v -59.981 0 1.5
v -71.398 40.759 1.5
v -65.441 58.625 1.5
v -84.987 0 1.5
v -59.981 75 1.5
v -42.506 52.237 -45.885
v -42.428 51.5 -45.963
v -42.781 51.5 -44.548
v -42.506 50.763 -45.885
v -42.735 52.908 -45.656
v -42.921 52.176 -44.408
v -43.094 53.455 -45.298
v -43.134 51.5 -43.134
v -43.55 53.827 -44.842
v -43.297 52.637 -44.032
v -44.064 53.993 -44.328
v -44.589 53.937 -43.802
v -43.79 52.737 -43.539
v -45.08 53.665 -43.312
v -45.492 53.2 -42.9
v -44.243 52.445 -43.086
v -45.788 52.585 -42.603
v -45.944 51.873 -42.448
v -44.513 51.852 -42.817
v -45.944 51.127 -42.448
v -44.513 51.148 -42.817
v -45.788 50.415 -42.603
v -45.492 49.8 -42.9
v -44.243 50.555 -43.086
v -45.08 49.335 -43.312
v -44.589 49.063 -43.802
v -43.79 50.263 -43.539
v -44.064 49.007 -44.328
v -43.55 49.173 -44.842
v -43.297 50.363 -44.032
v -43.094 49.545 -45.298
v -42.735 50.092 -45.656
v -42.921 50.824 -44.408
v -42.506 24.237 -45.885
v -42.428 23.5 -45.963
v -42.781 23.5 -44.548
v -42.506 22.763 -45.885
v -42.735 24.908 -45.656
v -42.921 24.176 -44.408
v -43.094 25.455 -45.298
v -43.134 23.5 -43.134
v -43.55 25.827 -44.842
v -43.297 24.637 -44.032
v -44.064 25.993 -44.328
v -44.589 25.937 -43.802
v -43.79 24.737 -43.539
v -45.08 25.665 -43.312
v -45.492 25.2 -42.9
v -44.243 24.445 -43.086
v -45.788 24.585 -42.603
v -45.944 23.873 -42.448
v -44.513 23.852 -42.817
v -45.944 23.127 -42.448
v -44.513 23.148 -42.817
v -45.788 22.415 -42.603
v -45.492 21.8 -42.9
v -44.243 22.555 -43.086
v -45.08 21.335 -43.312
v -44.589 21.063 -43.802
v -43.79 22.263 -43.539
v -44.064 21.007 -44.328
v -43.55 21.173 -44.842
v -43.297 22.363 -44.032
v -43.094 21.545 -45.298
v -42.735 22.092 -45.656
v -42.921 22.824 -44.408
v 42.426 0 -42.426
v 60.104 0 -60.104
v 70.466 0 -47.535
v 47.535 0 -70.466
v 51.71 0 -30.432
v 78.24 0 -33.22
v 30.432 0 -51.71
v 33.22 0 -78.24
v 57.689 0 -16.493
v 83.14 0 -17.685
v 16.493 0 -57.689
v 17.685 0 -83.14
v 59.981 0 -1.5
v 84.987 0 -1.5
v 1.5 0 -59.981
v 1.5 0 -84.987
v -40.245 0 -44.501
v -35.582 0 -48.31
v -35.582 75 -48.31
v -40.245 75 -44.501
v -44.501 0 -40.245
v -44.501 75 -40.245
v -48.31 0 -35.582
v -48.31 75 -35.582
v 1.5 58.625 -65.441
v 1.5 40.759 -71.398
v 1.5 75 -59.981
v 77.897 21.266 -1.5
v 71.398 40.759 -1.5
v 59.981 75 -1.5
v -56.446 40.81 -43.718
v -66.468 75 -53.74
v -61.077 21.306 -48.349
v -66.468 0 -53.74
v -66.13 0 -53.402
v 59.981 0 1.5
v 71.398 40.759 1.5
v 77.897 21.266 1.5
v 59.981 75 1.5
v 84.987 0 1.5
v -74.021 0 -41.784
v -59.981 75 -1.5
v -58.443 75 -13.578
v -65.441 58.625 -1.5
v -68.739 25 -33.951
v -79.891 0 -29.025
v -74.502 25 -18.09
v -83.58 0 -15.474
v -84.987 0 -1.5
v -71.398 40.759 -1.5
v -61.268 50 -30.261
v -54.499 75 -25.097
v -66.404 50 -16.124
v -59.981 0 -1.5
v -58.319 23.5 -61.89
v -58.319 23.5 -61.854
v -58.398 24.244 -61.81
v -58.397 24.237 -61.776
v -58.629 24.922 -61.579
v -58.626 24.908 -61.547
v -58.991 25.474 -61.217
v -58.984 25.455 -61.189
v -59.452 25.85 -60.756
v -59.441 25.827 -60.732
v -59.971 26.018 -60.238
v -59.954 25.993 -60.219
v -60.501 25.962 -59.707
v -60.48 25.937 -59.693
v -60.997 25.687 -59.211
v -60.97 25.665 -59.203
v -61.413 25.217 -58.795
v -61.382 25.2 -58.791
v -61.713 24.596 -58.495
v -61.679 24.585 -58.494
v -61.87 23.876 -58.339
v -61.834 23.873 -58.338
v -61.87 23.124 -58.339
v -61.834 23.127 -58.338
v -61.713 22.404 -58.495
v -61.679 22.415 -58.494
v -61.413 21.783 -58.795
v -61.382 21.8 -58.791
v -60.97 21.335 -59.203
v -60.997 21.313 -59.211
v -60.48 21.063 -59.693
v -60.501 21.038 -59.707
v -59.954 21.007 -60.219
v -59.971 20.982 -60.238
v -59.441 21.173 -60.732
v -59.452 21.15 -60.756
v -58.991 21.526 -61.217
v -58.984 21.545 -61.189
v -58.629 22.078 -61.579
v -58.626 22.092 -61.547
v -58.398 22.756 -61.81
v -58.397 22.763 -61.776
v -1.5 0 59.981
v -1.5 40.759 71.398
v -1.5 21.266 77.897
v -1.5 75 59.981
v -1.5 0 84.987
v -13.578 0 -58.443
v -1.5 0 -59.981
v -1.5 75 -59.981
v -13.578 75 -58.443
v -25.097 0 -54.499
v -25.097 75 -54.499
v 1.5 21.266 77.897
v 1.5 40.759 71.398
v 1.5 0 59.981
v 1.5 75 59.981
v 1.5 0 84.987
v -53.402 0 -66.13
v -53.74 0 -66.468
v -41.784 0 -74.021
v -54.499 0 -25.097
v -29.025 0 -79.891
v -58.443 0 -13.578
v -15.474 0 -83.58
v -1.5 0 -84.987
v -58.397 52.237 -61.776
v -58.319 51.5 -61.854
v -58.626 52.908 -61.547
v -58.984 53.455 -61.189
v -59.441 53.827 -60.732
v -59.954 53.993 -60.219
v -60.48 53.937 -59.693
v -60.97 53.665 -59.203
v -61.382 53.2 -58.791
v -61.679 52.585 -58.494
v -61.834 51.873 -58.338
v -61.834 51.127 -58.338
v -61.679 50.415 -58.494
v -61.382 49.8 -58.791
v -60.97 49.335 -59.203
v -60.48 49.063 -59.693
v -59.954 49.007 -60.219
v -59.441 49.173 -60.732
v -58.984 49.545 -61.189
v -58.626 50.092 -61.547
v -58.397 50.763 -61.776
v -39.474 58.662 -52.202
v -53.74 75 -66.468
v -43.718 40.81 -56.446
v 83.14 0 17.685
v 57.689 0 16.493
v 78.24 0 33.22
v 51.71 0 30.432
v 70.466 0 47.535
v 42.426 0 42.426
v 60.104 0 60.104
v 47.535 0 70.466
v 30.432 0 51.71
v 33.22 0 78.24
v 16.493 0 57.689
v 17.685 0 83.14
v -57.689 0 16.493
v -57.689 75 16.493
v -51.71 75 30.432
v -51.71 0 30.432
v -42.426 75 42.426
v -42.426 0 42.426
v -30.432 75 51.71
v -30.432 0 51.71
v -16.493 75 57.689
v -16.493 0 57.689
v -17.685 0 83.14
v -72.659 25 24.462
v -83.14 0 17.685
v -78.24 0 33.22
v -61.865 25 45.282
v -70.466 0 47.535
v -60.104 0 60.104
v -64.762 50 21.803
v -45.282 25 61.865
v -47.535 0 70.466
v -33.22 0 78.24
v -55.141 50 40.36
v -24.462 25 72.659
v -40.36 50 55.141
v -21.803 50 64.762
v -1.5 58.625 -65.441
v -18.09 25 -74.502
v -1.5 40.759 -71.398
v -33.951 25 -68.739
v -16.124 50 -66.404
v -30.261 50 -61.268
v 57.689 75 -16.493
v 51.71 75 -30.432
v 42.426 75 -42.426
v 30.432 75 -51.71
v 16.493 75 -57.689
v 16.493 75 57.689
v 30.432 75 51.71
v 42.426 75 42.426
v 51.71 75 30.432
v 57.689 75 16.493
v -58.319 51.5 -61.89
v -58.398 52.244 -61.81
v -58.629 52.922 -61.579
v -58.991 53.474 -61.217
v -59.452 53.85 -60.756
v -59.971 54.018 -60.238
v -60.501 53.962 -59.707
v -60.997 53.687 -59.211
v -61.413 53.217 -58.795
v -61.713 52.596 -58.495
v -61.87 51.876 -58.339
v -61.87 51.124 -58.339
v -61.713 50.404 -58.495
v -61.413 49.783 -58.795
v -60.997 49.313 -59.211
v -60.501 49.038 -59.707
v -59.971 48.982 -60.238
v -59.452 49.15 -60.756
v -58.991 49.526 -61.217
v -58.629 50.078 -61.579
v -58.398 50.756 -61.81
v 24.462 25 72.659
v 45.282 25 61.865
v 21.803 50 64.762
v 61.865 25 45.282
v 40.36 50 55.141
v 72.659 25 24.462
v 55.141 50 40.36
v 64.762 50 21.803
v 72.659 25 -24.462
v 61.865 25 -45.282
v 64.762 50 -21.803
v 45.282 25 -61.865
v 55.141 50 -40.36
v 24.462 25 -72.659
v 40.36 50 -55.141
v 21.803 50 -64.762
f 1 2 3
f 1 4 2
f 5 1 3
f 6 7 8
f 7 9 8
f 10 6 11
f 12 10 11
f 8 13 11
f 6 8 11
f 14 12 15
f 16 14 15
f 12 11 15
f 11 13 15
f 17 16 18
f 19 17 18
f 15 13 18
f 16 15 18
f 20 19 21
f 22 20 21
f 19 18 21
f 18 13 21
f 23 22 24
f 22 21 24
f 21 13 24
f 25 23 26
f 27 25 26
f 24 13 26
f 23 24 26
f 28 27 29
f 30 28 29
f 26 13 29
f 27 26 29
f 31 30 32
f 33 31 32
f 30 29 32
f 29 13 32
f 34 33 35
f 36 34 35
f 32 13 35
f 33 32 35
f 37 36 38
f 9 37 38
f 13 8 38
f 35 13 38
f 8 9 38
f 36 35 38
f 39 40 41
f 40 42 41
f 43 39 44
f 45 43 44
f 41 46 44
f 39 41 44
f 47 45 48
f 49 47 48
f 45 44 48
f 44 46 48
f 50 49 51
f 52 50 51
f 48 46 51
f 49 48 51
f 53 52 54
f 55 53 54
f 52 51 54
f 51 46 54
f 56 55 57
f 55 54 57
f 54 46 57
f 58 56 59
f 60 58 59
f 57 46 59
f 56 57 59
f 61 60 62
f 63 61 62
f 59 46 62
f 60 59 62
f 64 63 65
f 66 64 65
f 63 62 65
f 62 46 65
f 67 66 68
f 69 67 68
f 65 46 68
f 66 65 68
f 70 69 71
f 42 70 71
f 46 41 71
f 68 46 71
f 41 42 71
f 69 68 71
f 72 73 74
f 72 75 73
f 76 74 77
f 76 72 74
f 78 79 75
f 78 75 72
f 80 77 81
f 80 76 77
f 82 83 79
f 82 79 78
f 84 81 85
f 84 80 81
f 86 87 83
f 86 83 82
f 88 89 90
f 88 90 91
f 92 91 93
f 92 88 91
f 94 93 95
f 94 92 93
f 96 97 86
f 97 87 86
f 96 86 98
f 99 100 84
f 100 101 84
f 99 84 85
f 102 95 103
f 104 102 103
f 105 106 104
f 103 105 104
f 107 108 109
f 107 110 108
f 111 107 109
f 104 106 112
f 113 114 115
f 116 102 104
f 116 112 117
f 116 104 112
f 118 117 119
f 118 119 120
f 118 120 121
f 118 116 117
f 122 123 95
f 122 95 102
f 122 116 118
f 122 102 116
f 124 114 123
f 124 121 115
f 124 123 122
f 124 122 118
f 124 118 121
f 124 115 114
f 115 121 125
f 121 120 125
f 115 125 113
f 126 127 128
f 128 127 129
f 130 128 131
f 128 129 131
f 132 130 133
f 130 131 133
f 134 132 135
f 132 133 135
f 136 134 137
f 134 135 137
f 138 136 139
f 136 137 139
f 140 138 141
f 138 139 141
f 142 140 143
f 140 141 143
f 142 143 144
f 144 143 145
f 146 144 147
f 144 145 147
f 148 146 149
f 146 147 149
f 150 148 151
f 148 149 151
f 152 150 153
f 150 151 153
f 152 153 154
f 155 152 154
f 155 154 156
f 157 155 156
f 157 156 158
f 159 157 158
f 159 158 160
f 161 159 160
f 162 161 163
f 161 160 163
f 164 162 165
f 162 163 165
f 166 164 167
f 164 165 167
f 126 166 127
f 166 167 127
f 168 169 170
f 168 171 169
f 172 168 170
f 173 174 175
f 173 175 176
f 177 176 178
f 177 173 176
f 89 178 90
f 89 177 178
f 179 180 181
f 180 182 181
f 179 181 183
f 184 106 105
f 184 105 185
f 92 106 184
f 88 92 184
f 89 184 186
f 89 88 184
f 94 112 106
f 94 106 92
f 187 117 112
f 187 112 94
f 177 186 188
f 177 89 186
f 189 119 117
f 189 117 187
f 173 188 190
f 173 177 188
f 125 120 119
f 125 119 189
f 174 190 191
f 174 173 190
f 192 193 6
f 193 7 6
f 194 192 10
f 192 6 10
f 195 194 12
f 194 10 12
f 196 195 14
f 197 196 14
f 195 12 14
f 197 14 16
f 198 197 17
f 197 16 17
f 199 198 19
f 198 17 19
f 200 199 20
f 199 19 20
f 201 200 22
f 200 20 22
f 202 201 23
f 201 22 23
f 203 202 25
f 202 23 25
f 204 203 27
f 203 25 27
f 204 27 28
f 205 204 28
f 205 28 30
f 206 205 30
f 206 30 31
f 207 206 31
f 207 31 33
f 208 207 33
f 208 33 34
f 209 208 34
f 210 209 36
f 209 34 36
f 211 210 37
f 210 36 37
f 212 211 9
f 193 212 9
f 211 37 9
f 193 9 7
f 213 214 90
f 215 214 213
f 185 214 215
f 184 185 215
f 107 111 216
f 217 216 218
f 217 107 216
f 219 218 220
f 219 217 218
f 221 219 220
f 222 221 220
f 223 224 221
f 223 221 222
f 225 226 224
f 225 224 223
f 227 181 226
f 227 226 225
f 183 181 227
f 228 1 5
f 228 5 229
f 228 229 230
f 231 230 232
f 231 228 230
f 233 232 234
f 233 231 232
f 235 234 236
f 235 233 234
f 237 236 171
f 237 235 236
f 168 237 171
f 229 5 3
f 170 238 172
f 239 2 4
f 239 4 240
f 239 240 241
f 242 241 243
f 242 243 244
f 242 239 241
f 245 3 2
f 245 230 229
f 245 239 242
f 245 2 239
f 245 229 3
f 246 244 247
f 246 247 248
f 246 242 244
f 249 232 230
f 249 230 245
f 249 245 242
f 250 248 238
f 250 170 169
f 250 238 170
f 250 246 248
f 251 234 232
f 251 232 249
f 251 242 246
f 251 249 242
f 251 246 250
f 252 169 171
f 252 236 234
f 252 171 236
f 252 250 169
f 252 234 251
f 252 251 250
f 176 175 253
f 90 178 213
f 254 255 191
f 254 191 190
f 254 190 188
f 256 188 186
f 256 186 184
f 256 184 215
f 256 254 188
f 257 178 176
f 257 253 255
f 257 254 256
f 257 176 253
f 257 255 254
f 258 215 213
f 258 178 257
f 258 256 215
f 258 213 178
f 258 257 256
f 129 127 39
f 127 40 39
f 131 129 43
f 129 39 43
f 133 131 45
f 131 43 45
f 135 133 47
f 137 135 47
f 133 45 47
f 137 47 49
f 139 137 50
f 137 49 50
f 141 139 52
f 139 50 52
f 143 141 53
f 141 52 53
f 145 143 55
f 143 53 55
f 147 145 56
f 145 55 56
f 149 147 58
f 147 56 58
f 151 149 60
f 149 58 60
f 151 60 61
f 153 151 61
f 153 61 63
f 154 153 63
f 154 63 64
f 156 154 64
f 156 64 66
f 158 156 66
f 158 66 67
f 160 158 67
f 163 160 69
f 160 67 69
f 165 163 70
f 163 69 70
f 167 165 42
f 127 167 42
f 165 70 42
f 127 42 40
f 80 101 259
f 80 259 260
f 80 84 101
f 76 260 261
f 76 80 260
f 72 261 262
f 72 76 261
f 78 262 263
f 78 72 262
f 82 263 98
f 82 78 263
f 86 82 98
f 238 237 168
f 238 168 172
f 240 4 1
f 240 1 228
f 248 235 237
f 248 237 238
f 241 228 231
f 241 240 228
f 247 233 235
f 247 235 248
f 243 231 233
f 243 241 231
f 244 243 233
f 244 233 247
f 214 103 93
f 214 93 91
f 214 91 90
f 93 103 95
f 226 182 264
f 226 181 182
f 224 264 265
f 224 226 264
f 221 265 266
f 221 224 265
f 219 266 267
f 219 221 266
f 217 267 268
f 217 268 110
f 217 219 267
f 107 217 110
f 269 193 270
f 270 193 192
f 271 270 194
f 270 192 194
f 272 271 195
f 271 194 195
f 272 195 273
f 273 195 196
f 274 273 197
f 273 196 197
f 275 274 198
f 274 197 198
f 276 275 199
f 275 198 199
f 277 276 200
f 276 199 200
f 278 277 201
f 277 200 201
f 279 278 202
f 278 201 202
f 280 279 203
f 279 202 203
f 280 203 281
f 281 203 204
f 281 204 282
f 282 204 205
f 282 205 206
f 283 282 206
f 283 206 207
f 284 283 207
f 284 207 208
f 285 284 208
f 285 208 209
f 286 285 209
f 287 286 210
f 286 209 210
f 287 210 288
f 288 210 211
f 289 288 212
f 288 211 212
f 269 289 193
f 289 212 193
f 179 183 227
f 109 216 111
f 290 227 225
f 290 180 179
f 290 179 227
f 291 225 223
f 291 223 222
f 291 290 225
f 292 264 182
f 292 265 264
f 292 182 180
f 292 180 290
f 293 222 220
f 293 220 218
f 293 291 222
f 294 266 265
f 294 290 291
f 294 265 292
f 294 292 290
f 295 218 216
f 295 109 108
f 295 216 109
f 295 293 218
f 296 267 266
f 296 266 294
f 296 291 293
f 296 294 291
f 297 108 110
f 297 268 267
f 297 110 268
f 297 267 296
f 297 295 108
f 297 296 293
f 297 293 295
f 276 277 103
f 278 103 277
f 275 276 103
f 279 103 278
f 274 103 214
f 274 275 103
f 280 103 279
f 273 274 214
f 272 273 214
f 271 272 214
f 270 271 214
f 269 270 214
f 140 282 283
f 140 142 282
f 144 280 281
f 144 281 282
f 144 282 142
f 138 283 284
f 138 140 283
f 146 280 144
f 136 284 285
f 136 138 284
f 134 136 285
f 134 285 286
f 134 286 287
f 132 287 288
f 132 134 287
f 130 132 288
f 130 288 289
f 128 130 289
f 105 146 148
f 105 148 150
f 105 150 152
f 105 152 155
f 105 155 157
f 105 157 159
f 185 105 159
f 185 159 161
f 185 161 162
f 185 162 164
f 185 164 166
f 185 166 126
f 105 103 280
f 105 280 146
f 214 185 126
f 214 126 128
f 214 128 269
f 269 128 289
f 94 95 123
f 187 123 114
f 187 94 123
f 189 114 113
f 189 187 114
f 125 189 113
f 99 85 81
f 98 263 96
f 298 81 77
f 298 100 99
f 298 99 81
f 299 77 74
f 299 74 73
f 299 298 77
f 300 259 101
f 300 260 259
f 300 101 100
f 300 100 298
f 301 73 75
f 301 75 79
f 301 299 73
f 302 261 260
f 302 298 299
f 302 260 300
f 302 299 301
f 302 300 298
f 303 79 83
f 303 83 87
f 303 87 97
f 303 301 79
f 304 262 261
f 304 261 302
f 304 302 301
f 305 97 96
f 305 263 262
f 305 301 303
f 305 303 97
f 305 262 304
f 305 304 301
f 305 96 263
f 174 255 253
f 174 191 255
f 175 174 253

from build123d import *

# Parameters (mm, degrees)
SKETCH2_W           = 25.018752931
SKETCH2_H           = 3
SKETCH2_W_2         = 3
SKETCH2_H_2         = 25.018752931
CUT_EXTRUDE1_DEPTH  = 142.686273153
BOSS_EXTRUDE1_DEPTH = 75


# Read off the part's stored shape, not the designer's step: Ø5.0 (5) Diameter Hole1
with BuildPart() as part:
    # Sketch1 → Revolve1 (revolve)
    with BuildSketch(Plane.XY, mode=Mode.PRIVATE) as revolve1_sk:
        Polygon((60, 75), (60, 0), (85, 0), align=None)
    revolve(revolve1_sk.sketch.rotate(Axis((0, 0, 0), (0, 1, 0)), 90), axis=Axis((0, 0, 0), (0, 1, 0)))

    # Sketch2 → Cut-Extrude1 (cut, through all)
    with BuildSketch(Plane.XZ):
        with Locations((72.490623535, 0)):
            Rectangle(SKETCH2_W, SKETCH2_H)
        with Locations((0, -72.490623535)):
            Rectangle(SKETCH2_W_2, SKETCH2_H_2)
        with Locations((-72.490623535, 0)):
            Rectangle(SKETCH2_W, SKETCH2_H)
        with Locations((0, 72.490623535)):
            Rectangle(SKETCH2_W_2, SKETCH2_H_2)
    extrude(amount=-CUT_EXTRUDE1_DEPTH, mode=Mode.SUBTRACT)


with BuildPart() as cut_extrude1_piece_1:
    # of the separate pieces the step leaves, piece 1, a body of its own (cut_extrude1_pieces)
    add(part.part.solids().sort_by_distance((1.5, 75, 59.981247069))[0])


with BuildPart() as cut_extrude1_piece_2:
    # of the separate pieces the step leaves, piece 2, a body of its own (cut_extrude1_pieces)
    add(part.part.solids().sort_by_distance((59.981247069, 75, -1.5))[0])


with BuildPart() as cut_extrude1_piece_3:
    # of the separate pieces the step leaves, piece 3, a body of its own (cut_extrude1_pieces)
    add(part.part.solids().sort_by_distance((-59.981247069, 0, 1.5))[0])


with BuildPart() as cut_extrude1_piece_4:
    # of the separate pieces the step leaves, piece 4, a body of its own (cut_extrude1_pieces)
    add(part.part.solids().sort_by_distance((-1.5, 0, -59.981247069))[0])

    # Sketch3 → Boss-Extrude1 (add)
    with BuildSketch(Plane.XZ):
        with BuildLine():
            Line((-66.468037432, -53.74011537), (-53.74011537, -66.468037432))
            Line((-53.74011537, -66.468037432), (-35.582433332, -48.310355393))
            ThreePointArc((-35.582433332, -48.310355393), (-42.426406871, -42.426406871), (-48.310355393, -35.582433332))
            Line((-48.310355393, -35.582433332), (-66.468037432, -53.74011537))
        make_face()
    extrude(amount=-BOSS_EXTRUDE1_DEPTH)

    # Ø5.0 (5) Diameter Hole1 outline → Ø5.0 (5) Diameter Hole1 (revolve, cut)
    with BuildSketch(Plane(origin=(0, 23.5, 0), x_dir=(0.7071067811865471, 0, -0.707106781186548), z_dir=(0, -1, 0))):
        Polygon((2.5, -62.502151548), (0, -61), (0, -85), (2.525, -85), (2.5, -84.975), align=None)
    revolve(axis=Axis((0, 23.5, 0), (0.707106781186548, 0, 0.7071067811865471)), mode=Mode.SUBTRACT)

    # 5.0 _5_ Diameter Hole1 2 outline → 5.0 _5_ Diameter Hole1 2 (revolve, cut)
    with BuildSketch(Plane(origin=(0, 51.5, 0), x_dir=(0.7071067811865471, 0, -0.707106781186548), z_dir=(0, -1, 0))):
        Polygon((2.5, -62.502151548), (0, -61), (0, -85), (2.525, -85), (2.5, -84.975), align=None)
    revolve(axis=Axis((0, 51.5, 0), (0.707106781186548, 0, 0.7071067811865471)), mode=Mode.SUBTRACT)


solid = Compound([cut_extrude1_piece_1.part, cut_extrude1_piece_2.part, cut_extrude1_piece_3.part, cut_extrude1_piece_4.part])
